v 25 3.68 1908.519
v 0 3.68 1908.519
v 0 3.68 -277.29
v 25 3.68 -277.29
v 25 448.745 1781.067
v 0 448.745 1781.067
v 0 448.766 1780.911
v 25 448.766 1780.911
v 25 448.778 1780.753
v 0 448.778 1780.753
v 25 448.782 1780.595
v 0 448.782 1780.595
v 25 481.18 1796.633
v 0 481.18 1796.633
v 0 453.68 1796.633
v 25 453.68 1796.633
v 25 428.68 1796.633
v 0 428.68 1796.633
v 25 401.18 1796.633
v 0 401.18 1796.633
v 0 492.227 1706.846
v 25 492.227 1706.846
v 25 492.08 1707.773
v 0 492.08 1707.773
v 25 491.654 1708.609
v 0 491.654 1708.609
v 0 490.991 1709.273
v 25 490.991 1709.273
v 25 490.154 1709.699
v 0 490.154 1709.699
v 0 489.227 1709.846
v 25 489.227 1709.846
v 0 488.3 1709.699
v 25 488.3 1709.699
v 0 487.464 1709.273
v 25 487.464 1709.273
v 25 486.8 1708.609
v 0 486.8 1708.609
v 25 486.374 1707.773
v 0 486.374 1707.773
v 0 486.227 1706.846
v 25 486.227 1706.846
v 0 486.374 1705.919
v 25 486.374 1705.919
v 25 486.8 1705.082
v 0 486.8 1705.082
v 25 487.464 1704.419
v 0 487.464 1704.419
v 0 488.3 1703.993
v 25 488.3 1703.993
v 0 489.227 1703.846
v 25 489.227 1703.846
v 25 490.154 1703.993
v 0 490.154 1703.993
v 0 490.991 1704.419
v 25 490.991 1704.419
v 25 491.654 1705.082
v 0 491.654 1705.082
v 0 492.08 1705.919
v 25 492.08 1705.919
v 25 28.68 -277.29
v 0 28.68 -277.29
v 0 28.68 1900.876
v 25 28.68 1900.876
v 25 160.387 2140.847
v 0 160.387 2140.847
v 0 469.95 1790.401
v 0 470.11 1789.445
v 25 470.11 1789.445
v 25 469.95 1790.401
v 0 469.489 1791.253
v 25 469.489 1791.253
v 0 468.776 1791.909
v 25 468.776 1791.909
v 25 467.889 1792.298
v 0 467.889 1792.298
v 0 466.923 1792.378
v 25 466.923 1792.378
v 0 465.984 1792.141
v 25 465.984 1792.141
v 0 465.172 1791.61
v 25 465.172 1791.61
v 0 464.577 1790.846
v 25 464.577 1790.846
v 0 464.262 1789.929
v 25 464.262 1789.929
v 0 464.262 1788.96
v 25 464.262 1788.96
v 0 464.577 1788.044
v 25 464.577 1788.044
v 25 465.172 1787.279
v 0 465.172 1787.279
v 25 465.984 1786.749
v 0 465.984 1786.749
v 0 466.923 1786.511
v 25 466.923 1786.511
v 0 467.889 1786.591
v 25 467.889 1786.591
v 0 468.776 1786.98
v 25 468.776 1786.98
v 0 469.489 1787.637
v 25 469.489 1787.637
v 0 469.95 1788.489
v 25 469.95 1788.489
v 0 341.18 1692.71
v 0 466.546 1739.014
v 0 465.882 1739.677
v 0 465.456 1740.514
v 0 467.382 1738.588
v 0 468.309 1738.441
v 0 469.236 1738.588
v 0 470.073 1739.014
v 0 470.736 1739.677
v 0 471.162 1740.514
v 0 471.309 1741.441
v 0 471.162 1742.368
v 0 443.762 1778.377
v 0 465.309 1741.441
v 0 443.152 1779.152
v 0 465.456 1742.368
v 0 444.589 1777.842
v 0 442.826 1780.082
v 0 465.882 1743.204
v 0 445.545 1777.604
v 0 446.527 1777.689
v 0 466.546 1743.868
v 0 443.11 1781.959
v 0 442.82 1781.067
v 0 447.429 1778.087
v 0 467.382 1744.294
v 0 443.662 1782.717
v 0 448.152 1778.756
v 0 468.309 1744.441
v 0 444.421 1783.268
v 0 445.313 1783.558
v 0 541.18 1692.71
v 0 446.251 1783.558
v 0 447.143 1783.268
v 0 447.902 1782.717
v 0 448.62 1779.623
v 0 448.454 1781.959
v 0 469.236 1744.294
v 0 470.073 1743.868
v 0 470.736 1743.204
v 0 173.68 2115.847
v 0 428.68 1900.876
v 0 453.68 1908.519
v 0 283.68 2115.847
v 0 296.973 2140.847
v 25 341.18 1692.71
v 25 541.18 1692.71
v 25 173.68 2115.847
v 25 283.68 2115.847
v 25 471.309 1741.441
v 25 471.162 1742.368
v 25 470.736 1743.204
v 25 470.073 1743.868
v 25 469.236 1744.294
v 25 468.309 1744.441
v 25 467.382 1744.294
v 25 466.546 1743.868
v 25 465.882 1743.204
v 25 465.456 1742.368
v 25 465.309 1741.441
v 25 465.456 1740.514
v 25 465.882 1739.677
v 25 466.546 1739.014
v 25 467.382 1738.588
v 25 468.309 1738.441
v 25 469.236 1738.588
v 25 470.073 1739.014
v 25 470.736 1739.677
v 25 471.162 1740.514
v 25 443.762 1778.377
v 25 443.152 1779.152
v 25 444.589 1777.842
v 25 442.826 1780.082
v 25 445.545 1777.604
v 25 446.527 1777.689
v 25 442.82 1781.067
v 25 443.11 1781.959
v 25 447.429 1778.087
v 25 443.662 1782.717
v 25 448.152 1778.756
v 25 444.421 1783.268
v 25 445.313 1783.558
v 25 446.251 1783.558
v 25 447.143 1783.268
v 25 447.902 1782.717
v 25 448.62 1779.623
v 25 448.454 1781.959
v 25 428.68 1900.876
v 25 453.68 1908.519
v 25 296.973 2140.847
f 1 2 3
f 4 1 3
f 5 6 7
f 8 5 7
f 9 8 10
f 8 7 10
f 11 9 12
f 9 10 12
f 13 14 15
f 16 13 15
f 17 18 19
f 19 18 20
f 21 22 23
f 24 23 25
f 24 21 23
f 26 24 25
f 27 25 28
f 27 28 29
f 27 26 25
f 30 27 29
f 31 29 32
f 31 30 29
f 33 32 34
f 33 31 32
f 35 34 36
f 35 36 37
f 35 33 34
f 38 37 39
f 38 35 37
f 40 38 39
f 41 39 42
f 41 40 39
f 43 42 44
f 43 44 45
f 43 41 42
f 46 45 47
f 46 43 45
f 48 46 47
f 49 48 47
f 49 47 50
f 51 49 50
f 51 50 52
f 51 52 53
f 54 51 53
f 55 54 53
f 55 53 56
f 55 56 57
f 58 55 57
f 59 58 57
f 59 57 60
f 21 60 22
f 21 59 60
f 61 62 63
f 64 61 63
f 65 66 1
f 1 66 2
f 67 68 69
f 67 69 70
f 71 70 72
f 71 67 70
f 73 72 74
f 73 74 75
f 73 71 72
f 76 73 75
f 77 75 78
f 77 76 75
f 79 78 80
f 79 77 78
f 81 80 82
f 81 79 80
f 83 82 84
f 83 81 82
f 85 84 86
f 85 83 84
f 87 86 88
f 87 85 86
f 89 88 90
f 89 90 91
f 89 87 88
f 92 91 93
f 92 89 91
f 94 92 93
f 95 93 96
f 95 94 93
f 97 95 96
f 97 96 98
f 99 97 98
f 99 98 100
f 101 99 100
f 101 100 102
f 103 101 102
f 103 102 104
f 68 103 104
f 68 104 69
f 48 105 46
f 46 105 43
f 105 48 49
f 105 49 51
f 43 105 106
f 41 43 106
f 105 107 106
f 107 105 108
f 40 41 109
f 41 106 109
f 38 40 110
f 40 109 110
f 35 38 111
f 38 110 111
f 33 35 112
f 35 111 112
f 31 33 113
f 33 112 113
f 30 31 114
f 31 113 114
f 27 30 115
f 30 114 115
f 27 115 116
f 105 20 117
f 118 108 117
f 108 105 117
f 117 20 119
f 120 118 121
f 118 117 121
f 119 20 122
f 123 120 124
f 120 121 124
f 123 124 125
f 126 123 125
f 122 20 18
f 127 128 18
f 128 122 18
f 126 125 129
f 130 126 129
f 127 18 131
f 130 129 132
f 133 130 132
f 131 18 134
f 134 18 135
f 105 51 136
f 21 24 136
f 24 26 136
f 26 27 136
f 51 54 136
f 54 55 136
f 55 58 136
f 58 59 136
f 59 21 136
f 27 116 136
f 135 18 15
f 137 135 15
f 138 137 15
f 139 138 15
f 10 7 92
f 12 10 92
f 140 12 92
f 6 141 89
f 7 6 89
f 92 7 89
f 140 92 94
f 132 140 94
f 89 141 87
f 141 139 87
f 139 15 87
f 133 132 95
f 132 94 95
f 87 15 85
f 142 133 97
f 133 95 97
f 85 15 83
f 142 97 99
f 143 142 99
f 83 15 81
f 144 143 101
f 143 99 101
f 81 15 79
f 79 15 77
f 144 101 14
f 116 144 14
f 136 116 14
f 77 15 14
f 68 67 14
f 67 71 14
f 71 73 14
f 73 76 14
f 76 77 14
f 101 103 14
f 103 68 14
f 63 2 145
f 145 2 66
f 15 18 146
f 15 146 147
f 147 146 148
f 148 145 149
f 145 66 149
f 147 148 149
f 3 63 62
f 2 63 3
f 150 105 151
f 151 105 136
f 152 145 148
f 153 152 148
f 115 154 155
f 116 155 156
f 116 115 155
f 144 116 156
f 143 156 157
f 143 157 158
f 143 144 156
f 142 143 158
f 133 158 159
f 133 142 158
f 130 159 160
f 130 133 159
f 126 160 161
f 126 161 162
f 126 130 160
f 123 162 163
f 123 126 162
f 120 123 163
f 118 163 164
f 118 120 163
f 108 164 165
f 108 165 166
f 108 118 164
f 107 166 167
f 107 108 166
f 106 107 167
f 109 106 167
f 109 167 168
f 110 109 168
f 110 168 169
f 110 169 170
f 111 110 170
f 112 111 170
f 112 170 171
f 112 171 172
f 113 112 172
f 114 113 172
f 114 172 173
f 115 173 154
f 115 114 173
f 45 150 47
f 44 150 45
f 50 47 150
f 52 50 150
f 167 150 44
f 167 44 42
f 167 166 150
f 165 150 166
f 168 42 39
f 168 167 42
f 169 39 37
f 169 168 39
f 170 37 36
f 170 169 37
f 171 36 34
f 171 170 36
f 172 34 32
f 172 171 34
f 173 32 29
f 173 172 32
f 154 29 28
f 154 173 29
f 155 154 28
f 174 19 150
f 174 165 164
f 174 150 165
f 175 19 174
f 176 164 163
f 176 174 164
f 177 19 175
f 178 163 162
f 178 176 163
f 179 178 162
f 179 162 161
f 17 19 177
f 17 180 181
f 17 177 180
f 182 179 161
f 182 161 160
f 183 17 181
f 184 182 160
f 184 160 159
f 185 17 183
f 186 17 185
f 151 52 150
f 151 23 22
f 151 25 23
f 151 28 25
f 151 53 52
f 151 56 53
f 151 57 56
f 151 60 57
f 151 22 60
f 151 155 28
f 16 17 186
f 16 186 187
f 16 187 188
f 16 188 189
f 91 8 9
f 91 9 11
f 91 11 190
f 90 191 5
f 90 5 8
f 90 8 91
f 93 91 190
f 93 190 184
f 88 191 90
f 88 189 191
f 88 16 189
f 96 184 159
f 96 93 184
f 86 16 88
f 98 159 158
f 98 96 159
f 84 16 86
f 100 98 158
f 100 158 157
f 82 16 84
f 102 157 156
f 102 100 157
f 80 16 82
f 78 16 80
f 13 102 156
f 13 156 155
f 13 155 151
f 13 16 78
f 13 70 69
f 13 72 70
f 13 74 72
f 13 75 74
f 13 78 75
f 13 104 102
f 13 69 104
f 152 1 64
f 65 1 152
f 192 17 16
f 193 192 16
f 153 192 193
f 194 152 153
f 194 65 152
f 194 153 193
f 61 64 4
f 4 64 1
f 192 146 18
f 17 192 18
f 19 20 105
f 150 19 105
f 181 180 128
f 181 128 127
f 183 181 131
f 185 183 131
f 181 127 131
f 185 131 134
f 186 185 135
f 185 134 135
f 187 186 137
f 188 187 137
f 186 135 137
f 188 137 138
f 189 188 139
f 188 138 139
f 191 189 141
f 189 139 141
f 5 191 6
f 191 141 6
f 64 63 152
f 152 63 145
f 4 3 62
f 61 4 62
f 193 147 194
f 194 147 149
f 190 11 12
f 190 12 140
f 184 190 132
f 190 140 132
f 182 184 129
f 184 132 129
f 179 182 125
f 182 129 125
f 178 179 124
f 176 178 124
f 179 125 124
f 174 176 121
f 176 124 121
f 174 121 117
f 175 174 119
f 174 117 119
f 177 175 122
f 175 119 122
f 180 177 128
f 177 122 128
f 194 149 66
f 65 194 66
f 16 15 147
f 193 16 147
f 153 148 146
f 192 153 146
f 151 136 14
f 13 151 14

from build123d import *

# Parameters (mm, degrees)
F0_W     = 25
F0_H     = 25
F0_R     = 3
F0_R_2   = 2.943766
F1_DEPTH = 25


with BuildPart() as f1:
    # F0 (on Right) → F1 (new body)
    with BuildSketch(Plane.YZ):
        Polygon((28.680211, 1900.875823), (3.680211, 1908.51909), (3.680211, -277.290163), (28.680211, -277.290163), align=None)
        Polygon((160.387475, 2140.847163), (3.680211, 1908.51909), (28.680211, 1900.875823), (173.680211, 2115.847163), align=None)
        Polygon((296.972947, 2140.847163), (160.387475, 2140.847163), (173.680211, 2115.847163), (283.680211, 2115.847163), align=None)
        Polygon((453.680211, 1908.51909), (296.972947, 2140.847163), (283.680211, 2115.847163), (428.680211, 1900.875823), align=None)
        Polygon((453.680211, 1821.632886), (453.680211, 1908.51909), (428.680211, 1900.875823), (428.680211, 1821.632886), align=None)
        with Locations((441.180211, 1809.132886)):
            Rectangle(F0_W, F0_H)
        with BuildLine():
            Line((476.079169, 1779.894328), (481.180211, 1796.632886))
            Line((481.180211, 1796.632886), (474.974158, 1781.067371))
            Line((474.974158, 1781.067371), (448.744883, 1781.067371))
            ThreePointArc((448.744883, 1781.067371), (448.772956, 1780.831839), (448.782334, 1780.594826))
            ThreePointArc((448.782334, 1780.594826), (445.54532, 1777.604203), (442.819784, 1781.067371))
            Line((442.819784, 1781.067371), (412.465903, 1781.067371))
            Line((412.465903, 1781.067371), (401.180211, 1796.632886))
            Line((401.180211, 1796.632886), (410.844222, 1779.894328))
            Line((410.844222, 1779.894328), (364.232844, 1699.161054))
            Line((364.232844, 1699.161054), (341.180211, 1692.709837))
            Line((341.180211, 1692.709837), (541.180211, 1692.709837))
            Line((541.180211, 1692.709837), (522.690546, 1699.161054))
            Line((522.690546, 1699.161054), (476.079169, 1779.894328))
        make_face()
        with Locations((489.227206, 1706.84576)):
            Circle(F0_R, mode=Mode.SUBTRACT)
        with Locations((468.309313, 1741.440773)):
            Circle(F0_R, mode=Mode.SUBTRACT)
        Polygon((541.180211, 1692.709837), (481.180211, 1796.632886), (476.079169, 1779.894328), (522.690546, 1699.161054), align=None)
        with BuildLine():
            Line((481.180211, 1796.632886), (453.680211, 1796.632886))
            Line((453.680211, 1796.632886), (428.680211, 1796.632886))
            Line((428.680211, 1796.632886), (401.180211, 1796.632886))
            Line((401.180211, 1796.632886), (412.465903, 1781.067371))
            Line((412.465903, 1781.067371), (442.819784, 1781.067371))
            ThreePointArc((442.819784, 1781.067371), (445.782334, 1783.594826), (448.744883, 1781.067371))
            Line((448.744883, 1781.067371), (474.974158, 1781.067371))
            Line((474.974158, 1781.067371), (481.180211, 1796.632886))
        make_face()
        with Locations((467.166099, 1789.444685)):
            Circle(F0_R_2, mode=Mode.SUBTRACT)
        Polygon((410.844222, 1779.894328), (401.180211, 1796.632886), (341.180211, 1692.709837), (364.232844, 1699.161054), align=None)
    extrude(amount=F1_DEPTH)


solid = f1.part
